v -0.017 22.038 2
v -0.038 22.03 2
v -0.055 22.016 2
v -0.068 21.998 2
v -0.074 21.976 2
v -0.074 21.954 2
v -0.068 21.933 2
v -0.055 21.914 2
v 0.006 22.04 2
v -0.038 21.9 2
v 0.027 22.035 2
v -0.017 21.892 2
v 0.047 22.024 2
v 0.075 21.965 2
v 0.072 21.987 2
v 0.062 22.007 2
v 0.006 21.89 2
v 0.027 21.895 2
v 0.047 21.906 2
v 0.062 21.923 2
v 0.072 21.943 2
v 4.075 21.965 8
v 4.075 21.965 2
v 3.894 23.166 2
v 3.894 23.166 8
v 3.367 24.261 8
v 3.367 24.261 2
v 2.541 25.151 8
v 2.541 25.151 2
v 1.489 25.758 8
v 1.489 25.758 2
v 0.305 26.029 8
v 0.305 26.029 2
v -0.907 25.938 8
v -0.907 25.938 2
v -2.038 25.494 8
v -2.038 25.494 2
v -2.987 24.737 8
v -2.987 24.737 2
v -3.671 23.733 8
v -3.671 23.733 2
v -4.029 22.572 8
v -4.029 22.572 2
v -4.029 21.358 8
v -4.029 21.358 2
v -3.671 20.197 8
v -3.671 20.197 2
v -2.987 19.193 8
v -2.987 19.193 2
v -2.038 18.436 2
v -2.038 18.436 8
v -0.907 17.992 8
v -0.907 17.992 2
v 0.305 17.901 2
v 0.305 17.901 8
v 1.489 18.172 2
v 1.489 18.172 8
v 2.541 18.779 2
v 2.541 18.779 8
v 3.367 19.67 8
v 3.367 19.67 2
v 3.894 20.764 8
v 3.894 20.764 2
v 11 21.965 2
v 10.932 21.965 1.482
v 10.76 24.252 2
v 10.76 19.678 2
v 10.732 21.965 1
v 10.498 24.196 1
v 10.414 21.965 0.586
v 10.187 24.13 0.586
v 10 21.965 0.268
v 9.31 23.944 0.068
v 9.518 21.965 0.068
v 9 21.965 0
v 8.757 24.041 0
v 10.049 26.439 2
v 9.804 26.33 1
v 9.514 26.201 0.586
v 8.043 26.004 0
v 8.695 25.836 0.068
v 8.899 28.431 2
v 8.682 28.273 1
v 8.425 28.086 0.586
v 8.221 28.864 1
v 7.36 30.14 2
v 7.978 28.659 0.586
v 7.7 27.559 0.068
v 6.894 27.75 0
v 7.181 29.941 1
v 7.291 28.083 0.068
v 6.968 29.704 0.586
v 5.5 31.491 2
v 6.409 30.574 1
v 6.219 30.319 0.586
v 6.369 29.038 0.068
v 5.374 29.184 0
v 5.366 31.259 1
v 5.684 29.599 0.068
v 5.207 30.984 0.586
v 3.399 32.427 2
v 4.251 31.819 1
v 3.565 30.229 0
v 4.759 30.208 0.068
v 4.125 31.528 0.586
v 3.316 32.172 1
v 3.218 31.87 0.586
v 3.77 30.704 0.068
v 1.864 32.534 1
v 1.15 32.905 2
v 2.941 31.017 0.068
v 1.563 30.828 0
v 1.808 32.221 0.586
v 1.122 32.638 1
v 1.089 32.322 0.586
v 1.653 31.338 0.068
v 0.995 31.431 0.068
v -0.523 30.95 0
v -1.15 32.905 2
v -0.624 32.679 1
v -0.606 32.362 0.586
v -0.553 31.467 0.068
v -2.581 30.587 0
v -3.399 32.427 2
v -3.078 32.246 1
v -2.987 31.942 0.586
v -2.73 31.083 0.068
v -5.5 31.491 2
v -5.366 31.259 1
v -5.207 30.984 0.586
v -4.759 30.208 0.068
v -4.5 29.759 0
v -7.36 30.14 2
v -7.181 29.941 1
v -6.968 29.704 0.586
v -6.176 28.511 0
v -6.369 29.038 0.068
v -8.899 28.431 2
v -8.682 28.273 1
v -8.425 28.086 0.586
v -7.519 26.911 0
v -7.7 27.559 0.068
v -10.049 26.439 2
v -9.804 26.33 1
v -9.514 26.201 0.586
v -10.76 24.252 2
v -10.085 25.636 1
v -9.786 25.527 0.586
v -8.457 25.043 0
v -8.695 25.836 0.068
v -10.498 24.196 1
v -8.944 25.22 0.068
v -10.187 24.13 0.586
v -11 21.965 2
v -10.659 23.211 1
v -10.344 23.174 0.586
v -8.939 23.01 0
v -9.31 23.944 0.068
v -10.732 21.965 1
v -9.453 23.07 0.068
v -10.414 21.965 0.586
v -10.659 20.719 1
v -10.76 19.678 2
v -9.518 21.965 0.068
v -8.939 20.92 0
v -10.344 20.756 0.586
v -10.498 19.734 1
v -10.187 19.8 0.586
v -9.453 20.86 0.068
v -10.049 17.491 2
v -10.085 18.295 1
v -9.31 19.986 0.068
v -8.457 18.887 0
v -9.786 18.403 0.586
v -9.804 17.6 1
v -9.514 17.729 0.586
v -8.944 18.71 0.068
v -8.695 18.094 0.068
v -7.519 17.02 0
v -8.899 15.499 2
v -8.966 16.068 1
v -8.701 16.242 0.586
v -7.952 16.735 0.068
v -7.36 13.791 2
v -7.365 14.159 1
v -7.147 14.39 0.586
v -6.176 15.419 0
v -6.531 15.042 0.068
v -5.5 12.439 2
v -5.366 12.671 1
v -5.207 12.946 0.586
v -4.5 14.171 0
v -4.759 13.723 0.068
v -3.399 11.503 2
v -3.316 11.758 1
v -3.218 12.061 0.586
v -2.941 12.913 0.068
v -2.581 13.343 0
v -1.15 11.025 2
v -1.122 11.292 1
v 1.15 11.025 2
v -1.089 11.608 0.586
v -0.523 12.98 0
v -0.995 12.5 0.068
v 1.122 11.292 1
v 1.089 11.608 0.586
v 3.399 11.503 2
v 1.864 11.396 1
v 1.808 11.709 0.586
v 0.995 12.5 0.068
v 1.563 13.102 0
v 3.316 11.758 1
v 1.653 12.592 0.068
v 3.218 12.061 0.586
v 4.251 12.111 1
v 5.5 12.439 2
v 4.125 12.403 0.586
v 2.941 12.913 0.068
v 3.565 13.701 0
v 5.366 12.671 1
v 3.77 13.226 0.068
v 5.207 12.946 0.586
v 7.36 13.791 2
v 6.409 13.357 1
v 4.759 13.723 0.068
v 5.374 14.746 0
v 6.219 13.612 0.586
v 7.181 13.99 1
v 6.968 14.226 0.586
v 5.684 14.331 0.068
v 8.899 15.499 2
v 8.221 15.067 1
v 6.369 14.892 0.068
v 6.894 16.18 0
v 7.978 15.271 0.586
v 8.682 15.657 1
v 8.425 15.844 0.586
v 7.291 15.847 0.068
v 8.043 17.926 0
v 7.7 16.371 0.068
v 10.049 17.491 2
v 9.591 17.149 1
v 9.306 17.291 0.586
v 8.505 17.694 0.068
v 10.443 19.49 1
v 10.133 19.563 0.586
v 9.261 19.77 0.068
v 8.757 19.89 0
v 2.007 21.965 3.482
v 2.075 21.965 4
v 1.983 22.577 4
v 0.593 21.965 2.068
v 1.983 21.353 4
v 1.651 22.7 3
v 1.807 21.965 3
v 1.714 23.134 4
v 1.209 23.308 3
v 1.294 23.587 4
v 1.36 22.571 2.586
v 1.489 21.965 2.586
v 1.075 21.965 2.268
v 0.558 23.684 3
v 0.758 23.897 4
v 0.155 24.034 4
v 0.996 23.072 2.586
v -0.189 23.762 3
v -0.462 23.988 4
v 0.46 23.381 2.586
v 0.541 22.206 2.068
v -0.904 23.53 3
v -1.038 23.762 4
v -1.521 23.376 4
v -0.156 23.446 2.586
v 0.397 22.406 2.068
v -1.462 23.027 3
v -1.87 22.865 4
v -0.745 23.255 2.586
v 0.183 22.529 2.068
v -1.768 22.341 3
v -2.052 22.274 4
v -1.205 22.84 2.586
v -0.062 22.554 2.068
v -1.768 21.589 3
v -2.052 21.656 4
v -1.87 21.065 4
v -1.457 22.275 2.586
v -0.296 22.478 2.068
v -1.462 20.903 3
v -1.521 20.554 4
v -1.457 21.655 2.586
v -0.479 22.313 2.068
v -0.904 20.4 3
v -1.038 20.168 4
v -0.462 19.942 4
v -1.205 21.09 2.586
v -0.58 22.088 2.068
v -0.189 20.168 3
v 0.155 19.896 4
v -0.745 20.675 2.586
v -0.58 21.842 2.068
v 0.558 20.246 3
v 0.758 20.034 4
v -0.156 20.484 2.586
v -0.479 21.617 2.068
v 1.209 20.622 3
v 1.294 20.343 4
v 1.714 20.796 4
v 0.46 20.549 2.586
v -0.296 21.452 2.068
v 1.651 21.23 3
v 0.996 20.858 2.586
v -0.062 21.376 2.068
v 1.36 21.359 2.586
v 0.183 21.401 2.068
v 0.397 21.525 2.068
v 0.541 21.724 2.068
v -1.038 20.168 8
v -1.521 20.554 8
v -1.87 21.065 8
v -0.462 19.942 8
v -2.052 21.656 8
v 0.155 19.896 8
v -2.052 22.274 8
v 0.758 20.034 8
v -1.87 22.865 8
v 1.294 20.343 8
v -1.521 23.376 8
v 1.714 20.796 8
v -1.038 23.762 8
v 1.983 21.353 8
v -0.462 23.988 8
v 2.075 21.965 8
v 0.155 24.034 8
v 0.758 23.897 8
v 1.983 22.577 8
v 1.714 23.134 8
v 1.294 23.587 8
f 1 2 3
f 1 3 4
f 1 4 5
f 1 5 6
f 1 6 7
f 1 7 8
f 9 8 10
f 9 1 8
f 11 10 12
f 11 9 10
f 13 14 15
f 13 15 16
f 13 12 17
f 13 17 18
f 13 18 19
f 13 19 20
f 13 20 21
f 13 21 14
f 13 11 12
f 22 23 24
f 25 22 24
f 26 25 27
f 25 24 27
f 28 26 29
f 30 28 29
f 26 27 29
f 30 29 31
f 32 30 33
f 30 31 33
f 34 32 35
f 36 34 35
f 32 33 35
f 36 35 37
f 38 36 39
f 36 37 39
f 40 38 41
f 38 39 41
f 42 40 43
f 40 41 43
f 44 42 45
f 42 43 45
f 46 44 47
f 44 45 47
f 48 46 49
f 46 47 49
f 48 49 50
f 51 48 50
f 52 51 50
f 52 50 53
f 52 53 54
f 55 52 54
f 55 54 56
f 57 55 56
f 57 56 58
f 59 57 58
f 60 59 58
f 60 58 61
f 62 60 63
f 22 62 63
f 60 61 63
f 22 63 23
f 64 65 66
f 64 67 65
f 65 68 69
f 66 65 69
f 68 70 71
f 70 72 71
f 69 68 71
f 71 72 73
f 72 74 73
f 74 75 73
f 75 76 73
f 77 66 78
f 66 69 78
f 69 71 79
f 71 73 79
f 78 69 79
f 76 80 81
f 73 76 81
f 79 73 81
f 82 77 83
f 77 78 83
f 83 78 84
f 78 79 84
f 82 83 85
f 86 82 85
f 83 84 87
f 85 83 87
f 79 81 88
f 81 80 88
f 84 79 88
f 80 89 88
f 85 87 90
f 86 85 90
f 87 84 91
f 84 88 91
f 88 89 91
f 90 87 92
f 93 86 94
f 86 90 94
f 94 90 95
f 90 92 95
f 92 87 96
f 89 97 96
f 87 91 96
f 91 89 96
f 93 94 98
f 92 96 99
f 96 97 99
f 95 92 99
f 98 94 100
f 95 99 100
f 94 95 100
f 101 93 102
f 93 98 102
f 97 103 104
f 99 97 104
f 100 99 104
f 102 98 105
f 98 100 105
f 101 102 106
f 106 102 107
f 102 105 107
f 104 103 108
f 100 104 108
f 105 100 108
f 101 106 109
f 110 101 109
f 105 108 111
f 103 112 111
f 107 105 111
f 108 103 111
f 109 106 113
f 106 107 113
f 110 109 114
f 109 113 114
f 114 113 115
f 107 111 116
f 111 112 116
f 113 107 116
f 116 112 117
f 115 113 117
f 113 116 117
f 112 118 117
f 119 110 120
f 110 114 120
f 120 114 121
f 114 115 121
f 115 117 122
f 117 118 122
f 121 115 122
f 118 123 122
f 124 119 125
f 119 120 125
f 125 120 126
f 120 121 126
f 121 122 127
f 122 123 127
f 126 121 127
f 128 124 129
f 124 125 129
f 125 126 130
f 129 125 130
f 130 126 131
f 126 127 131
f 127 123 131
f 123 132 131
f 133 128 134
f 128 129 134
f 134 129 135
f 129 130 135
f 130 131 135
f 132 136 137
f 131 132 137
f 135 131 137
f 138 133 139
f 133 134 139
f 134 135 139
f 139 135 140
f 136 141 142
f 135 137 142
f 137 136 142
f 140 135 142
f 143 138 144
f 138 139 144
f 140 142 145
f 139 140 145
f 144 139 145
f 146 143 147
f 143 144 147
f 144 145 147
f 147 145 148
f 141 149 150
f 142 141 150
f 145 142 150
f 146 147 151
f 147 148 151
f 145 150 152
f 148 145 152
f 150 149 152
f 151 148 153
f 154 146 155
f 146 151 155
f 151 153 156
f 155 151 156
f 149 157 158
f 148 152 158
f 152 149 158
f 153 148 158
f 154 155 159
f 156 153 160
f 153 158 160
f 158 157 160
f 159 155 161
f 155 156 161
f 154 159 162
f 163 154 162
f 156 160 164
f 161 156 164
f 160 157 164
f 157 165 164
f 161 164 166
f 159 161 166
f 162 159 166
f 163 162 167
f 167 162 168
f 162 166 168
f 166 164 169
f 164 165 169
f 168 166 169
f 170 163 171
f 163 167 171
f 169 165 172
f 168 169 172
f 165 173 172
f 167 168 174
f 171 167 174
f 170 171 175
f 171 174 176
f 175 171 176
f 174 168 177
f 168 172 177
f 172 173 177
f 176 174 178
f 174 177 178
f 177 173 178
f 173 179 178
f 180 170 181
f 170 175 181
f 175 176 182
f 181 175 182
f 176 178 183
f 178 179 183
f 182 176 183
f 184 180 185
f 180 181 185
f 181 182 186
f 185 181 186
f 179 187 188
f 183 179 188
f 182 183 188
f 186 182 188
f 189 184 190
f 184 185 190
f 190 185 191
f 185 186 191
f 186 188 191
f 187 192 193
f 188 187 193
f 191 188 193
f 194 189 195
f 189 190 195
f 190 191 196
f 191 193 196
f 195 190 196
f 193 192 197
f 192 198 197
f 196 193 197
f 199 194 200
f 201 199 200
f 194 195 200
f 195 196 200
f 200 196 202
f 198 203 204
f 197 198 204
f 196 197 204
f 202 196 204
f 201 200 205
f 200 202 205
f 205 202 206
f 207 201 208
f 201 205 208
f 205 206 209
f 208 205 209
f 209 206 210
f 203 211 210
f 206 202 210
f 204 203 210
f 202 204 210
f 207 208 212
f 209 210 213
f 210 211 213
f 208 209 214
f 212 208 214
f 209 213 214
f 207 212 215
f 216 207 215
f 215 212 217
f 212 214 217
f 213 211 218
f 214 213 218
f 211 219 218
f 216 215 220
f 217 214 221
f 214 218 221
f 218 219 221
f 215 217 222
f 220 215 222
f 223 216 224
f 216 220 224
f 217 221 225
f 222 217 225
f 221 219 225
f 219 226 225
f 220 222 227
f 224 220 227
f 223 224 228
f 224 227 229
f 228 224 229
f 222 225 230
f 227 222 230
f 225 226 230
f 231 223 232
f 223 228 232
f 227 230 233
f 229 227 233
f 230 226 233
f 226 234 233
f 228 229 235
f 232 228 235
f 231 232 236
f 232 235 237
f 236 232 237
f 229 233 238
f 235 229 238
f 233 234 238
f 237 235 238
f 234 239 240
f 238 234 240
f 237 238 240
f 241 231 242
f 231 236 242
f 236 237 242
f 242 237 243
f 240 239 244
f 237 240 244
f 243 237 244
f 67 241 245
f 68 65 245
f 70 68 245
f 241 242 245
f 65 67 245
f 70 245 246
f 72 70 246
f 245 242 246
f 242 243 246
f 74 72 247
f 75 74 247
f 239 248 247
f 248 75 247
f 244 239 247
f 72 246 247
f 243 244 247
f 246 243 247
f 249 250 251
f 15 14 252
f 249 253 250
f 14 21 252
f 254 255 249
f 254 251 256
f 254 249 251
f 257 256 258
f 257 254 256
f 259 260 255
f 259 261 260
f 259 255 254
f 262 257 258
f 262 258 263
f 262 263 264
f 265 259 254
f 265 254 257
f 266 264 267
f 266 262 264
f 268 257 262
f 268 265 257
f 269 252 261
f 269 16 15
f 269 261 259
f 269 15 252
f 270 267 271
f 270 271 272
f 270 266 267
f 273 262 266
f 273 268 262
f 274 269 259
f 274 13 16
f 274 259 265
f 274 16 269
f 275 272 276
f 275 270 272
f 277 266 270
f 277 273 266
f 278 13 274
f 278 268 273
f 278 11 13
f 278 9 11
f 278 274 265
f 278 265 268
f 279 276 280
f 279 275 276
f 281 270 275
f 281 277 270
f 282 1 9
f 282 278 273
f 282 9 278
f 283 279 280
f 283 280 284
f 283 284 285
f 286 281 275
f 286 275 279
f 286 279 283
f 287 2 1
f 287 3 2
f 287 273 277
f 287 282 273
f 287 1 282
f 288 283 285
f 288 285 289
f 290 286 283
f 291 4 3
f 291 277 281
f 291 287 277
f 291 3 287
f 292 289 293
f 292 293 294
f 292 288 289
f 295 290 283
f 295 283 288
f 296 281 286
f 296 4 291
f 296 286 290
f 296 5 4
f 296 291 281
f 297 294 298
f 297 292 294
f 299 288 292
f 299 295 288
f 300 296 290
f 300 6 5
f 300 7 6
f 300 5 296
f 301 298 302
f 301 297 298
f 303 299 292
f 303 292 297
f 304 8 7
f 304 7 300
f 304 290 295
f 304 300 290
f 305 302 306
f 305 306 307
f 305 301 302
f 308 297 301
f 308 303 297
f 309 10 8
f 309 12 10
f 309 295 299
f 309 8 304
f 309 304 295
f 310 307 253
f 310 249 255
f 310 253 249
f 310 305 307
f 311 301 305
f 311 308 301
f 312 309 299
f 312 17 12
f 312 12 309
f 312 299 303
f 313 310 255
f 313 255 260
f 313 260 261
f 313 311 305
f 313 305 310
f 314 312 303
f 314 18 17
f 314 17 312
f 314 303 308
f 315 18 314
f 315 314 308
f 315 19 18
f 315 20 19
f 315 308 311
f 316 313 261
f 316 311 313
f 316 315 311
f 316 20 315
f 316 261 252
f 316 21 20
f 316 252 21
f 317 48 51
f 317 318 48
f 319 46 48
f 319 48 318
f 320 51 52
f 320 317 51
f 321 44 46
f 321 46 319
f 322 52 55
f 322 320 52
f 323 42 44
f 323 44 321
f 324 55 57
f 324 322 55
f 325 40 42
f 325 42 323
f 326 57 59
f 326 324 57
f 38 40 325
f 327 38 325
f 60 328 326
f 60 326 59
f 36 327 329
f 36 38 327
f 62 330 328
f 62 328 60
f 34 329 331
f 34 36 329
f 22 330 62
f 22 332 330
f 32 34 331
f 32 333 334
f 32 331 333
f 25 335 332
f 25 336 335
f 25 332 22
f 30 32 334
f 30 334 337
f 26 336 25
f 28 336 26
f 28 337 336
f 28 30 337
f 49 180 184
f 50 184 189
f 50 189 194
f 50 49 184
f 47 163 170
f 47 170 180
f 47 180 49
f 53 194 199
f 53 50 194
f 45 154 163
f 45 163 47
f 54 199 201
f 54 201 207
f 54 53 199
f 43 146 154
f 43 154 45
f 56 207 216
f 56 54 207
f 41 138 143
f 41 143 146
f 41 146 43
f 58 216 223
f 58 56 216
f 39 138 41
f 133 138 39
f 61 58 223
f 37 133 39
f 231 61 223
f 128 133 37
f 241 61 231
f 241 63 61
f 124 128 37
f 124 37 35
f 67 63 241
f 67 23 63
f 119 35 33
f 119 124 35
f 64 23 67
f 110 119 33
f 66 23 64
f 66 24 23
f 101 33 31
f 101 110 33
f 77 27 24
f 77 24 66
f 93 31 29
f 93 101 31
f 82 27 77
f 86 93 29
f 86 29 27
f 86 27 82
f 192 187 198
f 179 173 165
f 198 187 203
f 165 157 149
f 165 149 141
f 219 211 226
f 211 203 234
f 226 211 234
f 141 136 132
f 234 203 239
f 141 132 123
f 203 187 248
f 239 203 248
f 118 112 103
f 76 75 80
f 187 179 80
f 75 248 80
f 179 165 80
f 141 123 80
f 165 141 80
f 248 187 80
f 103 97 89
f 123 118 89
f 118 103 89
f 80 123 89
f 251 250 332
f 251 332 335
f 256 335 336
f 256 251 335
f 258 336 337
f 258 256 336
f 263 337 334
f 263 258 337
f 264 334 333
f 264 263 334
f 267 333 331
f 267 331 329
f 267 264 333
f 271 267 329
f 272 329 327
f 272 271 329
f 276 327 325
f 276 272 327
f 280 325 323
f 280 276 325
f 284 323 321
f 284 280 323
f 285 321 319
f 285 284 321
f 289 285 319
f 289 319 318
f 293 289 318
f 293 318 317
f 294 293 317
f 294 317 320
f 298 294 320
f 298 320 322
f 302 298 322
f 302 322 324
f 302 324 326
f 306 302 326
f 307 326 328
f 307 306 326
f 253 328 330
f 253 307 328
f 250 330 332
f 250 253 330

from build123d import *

# Parameters (mm, degrees)
F0_R     = 11
F1_DEPTH = 2
F3_R     = 4.075
F3_R_2   = 2.075
F4_DEPTH = 6
F5_R     = 1.99999
F6_R     = 2


# Not quite as in the source:
# - a fillet or chamfer is up to 0.001 mm smaller than in the source, because OpenCascade refuses the exact size
# - a feature names something its author has since deleted; it is built from what else it names


with BuildPart() as f1:
    # F0 (on Top) → F1 (new body)
    with BuildSketch(Plane.XY):
        with Locations((0, 21.965100023)):
            Circle(F0_R)
    extrude(amount=F1_DEPTH)

    # F3 (on face) → F4 (join)
    with BuildSketch(Plane.XY.offset(2)):
        with Locations((0, 21.965100023)):
            Circle(F3_R)
        with Locations((0, 21.965100023)):
            Circle(F3_R_2, mode=Mode.SUBTRACT)
    extrude(amount=F4_DEPTH)

    # F5 (radius 2 in the source; OpenCascade refuses exactly that, so slightly less here)
    f5_edges = [f1.edges().sort_by_distance(p)[0] for p in [
        (-11, 21.9651, 0),
    ]]
    fillet(f5_edges, radius=F5_R)

    # F6
    f6_edges = [f1.edges().sort_by_distance(p)[0] for p in [
        (-2.075, 21.9651, 2),
    ]]
    fillet(f6_edges, radius=F6_R)


solid = f1.part
